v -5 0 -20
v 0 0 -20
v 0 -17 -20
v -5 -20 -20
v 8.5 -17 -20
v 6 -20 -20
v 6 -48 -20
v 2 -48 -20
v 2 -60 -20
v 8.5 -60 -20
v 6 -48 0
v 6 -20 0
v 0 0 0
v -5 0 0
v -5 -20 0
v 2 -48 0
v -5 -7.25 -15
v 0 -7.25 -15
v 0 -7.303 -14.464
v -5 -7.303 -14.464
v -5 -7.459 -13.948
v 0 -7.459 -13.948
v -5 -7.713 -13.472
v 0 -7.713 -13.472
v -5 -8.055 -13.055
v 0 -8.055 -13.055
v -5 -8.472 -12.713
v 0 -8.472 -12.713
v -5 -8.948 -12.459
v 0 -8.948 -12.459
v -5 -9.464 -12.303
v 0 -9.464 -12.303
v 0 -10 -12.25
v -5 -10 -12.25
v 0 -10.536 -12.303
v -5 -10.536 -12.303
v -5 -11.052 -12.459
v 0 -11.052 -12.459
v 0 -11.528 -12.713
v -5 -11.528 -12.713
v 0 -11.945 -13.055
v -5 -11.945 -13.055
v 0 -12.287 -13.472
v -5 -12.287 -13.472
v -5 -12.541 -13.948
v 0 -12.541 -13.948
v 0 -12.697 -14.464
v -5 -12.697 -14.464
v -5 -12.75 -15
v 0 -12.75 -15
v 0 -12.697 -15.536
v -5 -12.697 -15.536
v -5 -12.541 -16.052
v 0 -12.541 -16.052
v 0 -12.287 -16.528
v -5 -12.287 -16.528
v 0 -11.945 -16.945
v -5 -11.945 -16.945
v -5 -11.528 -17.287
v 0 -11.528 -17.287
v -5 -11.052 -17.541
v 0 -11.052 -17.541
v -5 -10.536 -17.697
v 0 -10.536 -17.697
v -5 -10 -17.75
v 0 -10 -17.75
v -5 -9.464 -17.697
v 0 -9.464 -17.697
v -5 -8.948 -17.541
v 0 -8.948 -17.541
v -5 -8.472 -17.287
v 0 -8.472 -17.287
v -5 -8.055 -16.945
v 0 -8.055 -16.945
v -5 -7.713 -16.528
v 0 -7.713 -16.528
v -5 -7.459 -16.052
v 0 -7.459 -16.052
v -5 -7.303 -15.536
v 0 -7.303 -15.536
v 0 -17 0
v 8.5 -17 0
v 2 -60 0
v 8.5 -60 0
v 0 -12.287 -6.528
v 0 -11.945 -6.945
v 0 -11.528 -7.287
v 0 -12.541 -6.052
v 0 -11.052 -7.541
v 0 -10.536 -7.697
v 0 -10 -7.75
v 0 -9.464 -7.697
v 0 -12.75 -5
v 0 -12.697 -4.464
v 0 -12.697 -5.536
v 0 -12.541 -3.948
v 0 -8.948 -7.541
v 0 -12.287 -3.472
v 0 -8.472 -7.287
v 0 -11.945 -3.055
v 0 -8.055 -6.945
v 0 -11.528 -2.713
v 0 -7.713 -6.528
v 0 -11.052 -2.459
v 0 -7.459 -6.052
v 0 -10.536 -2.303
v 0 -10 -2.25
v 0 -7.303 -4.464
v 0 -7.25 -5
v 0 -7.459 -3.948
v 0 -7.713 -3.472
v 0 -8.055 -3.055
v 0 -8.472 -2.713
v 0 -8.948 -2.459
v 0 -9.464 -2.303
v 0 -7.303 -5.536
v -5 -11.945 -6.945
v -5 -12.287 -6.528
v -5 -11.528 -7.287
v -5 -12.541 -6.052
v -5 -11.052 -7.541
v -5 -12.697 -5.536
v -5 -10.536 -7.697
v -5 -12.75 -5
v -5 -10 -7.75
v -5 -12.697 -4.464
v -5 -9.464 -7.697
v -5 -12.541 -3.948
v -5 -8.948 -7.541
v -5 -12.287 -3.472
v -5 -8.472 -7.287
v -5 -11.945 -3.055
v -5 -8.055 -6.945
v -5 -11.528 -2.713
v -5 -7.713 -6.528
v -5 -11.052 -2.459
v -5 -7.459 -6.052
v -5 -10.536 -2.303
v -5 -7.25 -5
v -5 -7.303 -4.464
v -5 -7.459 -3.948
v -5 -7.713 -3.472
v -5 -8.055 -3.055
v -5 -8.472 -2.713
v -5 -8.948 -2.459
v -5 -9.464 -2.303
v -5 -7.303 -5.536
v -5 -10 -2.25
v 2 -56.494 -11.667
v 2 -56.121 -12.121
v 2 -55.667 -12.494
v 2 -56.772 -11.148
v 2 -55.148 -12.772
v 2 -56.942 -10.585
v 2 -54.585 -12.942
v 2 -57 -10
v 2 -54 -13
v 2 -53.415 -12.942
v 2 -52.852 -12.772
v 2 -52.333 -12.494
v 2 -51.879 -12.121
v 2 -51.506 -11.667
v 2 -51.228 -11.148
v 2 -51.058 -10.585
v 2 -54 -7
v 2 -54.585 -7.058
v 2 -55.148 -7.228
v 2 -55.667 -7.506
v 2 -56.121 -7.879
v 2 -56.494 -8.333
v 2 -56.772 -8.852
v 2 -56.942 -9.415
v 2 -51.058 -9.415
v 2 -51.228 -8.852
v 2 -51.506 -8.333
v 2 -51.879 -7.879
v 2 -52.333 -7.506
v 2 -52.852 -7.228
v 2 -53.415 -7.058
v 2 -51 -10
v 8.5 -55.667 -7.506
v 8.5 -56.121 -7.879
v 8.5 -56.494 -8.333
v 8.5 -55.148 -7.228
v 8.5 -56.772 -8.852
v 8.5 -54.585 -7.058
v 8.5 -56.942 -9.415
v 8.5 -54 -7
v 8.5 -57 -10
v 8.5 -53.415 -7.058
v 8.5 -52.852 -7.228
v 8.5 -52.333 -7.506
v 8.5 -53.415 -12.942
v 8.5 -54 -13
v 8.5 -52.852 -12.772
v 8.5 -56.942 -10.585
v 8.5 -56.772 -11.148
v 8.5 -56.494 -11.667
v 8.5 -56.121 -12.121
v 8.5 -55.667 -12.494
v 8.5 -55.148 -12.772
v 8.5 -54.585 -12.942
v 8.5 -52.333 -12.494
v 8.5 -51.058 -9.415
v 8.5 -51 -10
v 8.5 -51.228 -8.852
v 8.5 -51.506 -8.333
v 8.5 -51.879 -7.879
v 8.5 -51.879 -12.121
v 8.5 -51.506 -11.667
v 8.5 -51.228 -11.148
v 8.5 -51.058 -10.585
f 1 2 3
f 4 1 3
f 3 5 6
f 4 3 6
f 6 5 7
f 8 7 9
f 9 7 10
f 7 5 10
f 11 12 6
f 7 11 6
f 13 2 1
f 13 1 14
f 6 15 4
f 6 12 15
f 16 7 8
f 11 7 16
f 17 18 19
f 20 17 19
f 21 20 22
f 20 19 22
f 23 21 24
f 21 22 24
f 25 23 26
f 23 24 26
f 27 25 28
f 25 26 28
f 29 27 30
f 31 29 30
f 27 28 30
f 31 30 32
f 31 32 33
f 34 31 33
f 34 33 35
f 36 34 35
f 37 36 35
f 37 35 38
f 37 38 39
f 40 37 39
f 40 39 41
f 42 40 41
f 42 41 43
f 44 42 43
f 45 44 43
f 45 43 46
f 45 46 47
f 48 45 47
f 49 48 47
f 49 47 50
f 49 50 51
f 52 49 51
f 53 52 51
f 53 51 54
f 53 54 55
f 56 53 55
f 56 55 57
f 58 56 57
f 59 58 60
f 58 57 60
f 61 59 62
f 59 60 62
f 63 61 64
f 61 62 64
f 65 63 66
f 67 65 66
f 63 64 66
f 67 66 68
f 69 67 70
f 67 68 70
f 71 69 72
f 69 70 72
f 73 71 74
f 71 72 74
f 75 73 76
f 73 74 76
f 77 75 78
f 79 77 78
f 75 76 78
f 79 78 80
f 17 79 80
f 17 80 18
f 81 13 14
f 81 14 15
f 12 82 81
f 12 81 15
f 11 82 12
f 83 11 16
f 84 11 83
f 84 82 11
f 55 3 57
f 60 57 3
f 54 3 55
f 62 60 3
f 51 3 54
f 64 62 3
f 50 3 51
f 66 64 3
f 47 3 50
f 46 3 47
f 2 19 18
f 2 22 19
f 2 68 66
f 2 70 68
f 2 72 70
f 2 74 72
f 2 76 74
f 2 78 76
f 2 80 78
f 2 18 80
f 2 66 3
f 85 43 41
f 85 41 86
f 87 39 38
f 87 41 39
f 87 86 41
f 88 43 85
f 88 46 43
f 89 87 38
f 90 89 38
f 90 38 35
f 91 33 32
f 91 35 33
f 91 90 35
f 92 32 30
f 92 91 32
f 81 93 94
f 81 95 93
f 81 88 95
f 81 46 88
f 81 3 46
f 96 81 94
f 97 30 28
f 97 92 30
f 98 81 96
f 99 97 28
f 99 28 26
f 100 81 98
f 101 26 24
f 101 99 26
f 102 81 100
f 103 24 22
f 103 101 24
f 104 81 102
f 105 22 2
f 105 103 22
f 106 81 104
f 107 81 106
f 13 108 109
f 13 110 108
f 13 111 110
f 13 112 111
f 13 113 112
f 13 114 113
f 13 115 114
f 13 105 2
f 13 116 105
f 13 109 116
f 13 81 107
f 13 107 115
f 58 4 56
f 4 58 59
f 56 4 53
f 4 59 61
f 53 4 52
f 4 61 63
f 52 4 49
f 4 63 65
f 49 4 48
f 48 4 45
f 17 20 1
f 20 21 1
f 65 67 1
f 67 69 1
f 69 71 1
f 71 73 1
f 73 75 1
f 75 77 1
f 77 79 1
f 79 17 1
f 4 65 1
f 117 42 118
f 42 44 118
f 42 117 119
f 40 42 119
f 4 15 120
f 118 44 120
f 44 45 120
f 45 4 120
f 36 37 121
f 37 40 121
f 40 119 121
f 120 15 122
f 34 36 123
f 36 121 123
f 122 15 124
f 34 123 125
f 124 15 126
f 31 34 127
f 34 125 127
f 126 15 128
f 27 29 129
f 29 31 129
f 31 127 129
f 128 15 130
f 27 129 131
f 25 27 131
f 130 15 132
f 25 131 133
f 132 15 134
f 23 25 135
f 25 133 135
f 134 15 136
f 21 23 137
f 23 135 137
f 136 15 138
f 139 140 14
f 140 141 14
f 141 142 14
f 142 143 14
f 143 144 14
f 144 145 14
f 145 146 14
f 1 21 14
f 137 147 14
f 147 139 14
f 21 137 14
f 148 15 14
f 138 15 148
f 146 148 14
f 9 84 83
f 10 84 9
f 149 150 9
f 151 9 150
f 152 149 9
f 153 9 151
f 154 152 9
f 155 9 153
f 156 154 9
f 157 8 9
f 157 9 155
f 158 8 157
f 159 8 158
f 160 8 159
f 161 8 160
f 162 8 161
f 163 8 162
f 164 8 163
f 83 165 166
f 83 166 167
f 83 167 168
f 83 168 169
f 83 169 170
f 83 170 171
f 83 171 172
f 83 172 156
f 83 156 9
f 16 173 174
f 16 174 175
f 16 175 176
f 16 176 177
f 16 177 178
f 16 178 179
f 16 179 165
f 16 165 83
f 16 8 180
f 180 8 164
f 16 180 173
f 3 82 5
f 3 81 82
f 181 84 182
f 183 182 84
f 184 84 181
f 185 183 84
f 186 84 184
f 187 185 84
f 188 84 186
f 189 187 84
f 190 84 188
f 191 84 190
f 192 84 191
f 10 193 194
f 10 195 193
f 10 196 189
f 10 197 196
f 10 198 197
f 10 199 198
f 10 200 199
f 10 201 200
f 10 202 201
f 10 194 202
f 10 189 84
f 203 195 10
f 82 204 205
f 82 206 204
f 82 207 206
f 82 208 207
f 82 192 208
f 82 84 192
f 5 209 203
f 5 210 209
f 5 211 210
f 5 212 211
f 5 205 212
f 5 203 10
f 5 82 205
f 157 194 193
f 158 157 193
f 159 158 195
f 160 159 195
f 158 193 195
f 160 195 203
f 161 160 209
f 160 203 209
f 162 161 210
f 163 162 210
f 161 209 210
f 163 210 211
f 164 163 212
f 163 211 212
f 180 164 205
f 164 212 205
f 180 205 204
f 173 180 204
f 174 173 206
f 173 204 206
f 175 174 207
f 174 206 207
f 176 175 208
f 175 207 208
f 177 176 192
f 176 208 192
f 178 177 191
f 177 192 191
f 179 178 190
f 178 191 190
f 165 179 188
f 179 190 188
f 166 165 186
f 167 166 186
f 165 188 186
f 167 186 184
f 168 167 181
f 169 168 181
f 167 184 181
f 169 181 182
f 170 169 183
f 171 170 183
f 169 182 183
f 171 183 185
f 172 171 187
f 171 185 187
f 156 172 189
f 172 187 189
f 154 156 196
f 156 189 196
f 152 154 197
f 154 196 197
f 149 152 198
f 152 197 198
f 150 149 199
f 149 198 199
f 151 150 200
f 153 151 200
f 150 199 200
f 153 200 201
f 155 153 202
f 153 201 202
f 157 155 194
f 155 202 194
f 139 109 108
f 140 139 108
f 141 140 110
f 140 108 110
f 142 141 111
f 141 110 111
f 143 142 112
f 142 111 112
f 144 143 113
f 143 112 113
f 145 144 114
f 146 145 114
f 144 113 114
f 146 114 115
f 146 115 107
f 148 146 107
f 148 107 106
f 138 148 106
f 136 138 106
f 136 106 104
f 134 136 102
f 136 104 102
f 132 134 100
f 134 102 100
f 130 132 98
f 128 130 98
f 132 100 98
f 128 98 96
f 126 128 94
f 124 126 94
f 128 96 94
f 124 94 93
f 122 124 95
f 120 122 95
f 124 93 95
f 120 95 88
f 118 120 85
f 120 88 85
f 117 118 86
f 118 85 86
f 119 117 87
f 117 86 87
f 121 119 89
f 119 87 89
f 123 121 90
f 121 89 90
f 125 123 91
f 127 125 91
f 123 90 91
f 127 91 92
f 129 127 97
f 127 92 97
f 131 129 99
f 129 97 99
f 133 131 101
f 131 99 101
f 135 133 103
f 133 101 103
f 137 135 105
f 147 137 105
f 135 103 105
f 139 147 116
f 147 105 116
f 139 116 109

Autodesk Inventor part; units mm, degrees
ref_plane "YZ Plane" through (0, 0, 0) normal (1, 0, 0) x (0, 1, 0)
ref_plane "XZ Plane" through (0, 0, 0) normal (0, 1, 0) x (-1, 0, 0)
ref_plane "XY Plane" through (0, 0, 0) normal (0, 0, 1) x (1, 0, 0)
sketch "Sketch1" plane through (0, 0, 0) normal (1, 0, 0) x (0, 1, 0)
  line L0 (0, 0) -> (-26.6, 0)
  line L1 (-26.6, 0) -> (-26.6, -20)
  line L2 (-26.6, -20) -> (0, -20)
  line L3 (0, -20) -> (0, 0)
  line L4 (0, 0) -> (-10, 0) construction
  line L5 (-10, 0) -> (-10, -5) construction
  circle A0 centre (-10, -5) radius 2.75
  line L6 (0, -20) -> (-10, -20) construction
  line L7 (-10, -20) -> (-10, -15) construction
  circle A1 centre (-10, -15) radius 2.75
  line L8 (-26.6, 0) -> (-20, 0)
  line L9 (-20, 0) -> (-20, -20)
  line L10 (-20, -20) -> (-26.6, -20)
  line L11 (-26.6, -20) -> (-26.6, 0)
  line L12 (-20, 0) -> (-17, 0)
  line L13 (-17, 0) -> (-17, -20)
  line L14 (-17, -20) -> (-20, -20)
  line L15 (-20, -20) -> (-20, 0)
  dimension "d0" = 26.6
  dimension "d1" = 20
  dimension "d2" = 10
  dimension "d3" = 5
  dimension "d4" = 5.5
  dimension "d5" = 10
  dimension "d6" = 5
  dimension "d7" = 5.5
  dimension "d8" = 6.6
  dimension "d9" = 3
extrude "Extrusion1" add sketch "Sketch1" along normal blind 8.5 contours L13 L2 L9 L0
extrude "Extrusion2" add sketch "Sketch1" against normal blind 5 contours L3 L2 L13 L0
extrude "Extrusion3" add sketch "Sketch1" against normal blind 5 contours L13 L2 L9 L0
sketch "Sketch2" plane through (8.5, -20, -20) normal (0, -1, 0) x (1, 0, 0)
  line L0 (0, 20) -> (0, 0) projected
  line L1 (-8.5, 0) -> (0, 0) projected
  line L2 (0, 20) -> (-2.5, 20)
  line L3 (-2.5, 20) -> (-2.5, 0)
  line L4 (-2.5, 0) -> (0, 0)
  line L5 (0, 0) -> (0, 20)
  point P0 (-8.5, 20)
  dimension "d16" = 2.5
extrude "Extrusion4" add sketch "Sketch2" along normal blind 40
sketch "Sketch3" plane through (8.5, 0, 0) normal (1, 0, 0) x (0, 0, -1)
  line L0 (20, -60) -> (0, -60) projected
  circle A0 centre (10, -54) radius 3
  point P0 (0, 0)
  dimension "d20" = 6
extrude "Extrusion5" cut sketch "Sketch3" against normal blind 7.5
sketch "Sketch4" plane through (6, -20, -20) normal (-1, 0, 0) x (0, 0, 1)
  line L0 (20, 3) -> (20, -40) projected
  line L1 (0, 3) -> (0, -40) projected
  line L2 (20, -40) -> (0, -40)
  line L3 (0, -40) -> (0, -28)
  line L4 (0, -28) -> (20, -28)
  line L5 (20, -28) -> (20, -40)
  point P0 (20, 20)
  dimension "d23" = 12
extrude "Extrusion6" add sketch "Sketch4" along normal blind 4
sketch "Sketch5" plane through (6, -54, -10) normal (1, 0, 0) x (0, 0, -1)
  circle A0 centre (0, 0) radius 3
  point P0 (-10, 54)
extrude "Extrusion7" cut sketch "Sketch5" against normal blind 4
properties part number "Laser_Holder"
